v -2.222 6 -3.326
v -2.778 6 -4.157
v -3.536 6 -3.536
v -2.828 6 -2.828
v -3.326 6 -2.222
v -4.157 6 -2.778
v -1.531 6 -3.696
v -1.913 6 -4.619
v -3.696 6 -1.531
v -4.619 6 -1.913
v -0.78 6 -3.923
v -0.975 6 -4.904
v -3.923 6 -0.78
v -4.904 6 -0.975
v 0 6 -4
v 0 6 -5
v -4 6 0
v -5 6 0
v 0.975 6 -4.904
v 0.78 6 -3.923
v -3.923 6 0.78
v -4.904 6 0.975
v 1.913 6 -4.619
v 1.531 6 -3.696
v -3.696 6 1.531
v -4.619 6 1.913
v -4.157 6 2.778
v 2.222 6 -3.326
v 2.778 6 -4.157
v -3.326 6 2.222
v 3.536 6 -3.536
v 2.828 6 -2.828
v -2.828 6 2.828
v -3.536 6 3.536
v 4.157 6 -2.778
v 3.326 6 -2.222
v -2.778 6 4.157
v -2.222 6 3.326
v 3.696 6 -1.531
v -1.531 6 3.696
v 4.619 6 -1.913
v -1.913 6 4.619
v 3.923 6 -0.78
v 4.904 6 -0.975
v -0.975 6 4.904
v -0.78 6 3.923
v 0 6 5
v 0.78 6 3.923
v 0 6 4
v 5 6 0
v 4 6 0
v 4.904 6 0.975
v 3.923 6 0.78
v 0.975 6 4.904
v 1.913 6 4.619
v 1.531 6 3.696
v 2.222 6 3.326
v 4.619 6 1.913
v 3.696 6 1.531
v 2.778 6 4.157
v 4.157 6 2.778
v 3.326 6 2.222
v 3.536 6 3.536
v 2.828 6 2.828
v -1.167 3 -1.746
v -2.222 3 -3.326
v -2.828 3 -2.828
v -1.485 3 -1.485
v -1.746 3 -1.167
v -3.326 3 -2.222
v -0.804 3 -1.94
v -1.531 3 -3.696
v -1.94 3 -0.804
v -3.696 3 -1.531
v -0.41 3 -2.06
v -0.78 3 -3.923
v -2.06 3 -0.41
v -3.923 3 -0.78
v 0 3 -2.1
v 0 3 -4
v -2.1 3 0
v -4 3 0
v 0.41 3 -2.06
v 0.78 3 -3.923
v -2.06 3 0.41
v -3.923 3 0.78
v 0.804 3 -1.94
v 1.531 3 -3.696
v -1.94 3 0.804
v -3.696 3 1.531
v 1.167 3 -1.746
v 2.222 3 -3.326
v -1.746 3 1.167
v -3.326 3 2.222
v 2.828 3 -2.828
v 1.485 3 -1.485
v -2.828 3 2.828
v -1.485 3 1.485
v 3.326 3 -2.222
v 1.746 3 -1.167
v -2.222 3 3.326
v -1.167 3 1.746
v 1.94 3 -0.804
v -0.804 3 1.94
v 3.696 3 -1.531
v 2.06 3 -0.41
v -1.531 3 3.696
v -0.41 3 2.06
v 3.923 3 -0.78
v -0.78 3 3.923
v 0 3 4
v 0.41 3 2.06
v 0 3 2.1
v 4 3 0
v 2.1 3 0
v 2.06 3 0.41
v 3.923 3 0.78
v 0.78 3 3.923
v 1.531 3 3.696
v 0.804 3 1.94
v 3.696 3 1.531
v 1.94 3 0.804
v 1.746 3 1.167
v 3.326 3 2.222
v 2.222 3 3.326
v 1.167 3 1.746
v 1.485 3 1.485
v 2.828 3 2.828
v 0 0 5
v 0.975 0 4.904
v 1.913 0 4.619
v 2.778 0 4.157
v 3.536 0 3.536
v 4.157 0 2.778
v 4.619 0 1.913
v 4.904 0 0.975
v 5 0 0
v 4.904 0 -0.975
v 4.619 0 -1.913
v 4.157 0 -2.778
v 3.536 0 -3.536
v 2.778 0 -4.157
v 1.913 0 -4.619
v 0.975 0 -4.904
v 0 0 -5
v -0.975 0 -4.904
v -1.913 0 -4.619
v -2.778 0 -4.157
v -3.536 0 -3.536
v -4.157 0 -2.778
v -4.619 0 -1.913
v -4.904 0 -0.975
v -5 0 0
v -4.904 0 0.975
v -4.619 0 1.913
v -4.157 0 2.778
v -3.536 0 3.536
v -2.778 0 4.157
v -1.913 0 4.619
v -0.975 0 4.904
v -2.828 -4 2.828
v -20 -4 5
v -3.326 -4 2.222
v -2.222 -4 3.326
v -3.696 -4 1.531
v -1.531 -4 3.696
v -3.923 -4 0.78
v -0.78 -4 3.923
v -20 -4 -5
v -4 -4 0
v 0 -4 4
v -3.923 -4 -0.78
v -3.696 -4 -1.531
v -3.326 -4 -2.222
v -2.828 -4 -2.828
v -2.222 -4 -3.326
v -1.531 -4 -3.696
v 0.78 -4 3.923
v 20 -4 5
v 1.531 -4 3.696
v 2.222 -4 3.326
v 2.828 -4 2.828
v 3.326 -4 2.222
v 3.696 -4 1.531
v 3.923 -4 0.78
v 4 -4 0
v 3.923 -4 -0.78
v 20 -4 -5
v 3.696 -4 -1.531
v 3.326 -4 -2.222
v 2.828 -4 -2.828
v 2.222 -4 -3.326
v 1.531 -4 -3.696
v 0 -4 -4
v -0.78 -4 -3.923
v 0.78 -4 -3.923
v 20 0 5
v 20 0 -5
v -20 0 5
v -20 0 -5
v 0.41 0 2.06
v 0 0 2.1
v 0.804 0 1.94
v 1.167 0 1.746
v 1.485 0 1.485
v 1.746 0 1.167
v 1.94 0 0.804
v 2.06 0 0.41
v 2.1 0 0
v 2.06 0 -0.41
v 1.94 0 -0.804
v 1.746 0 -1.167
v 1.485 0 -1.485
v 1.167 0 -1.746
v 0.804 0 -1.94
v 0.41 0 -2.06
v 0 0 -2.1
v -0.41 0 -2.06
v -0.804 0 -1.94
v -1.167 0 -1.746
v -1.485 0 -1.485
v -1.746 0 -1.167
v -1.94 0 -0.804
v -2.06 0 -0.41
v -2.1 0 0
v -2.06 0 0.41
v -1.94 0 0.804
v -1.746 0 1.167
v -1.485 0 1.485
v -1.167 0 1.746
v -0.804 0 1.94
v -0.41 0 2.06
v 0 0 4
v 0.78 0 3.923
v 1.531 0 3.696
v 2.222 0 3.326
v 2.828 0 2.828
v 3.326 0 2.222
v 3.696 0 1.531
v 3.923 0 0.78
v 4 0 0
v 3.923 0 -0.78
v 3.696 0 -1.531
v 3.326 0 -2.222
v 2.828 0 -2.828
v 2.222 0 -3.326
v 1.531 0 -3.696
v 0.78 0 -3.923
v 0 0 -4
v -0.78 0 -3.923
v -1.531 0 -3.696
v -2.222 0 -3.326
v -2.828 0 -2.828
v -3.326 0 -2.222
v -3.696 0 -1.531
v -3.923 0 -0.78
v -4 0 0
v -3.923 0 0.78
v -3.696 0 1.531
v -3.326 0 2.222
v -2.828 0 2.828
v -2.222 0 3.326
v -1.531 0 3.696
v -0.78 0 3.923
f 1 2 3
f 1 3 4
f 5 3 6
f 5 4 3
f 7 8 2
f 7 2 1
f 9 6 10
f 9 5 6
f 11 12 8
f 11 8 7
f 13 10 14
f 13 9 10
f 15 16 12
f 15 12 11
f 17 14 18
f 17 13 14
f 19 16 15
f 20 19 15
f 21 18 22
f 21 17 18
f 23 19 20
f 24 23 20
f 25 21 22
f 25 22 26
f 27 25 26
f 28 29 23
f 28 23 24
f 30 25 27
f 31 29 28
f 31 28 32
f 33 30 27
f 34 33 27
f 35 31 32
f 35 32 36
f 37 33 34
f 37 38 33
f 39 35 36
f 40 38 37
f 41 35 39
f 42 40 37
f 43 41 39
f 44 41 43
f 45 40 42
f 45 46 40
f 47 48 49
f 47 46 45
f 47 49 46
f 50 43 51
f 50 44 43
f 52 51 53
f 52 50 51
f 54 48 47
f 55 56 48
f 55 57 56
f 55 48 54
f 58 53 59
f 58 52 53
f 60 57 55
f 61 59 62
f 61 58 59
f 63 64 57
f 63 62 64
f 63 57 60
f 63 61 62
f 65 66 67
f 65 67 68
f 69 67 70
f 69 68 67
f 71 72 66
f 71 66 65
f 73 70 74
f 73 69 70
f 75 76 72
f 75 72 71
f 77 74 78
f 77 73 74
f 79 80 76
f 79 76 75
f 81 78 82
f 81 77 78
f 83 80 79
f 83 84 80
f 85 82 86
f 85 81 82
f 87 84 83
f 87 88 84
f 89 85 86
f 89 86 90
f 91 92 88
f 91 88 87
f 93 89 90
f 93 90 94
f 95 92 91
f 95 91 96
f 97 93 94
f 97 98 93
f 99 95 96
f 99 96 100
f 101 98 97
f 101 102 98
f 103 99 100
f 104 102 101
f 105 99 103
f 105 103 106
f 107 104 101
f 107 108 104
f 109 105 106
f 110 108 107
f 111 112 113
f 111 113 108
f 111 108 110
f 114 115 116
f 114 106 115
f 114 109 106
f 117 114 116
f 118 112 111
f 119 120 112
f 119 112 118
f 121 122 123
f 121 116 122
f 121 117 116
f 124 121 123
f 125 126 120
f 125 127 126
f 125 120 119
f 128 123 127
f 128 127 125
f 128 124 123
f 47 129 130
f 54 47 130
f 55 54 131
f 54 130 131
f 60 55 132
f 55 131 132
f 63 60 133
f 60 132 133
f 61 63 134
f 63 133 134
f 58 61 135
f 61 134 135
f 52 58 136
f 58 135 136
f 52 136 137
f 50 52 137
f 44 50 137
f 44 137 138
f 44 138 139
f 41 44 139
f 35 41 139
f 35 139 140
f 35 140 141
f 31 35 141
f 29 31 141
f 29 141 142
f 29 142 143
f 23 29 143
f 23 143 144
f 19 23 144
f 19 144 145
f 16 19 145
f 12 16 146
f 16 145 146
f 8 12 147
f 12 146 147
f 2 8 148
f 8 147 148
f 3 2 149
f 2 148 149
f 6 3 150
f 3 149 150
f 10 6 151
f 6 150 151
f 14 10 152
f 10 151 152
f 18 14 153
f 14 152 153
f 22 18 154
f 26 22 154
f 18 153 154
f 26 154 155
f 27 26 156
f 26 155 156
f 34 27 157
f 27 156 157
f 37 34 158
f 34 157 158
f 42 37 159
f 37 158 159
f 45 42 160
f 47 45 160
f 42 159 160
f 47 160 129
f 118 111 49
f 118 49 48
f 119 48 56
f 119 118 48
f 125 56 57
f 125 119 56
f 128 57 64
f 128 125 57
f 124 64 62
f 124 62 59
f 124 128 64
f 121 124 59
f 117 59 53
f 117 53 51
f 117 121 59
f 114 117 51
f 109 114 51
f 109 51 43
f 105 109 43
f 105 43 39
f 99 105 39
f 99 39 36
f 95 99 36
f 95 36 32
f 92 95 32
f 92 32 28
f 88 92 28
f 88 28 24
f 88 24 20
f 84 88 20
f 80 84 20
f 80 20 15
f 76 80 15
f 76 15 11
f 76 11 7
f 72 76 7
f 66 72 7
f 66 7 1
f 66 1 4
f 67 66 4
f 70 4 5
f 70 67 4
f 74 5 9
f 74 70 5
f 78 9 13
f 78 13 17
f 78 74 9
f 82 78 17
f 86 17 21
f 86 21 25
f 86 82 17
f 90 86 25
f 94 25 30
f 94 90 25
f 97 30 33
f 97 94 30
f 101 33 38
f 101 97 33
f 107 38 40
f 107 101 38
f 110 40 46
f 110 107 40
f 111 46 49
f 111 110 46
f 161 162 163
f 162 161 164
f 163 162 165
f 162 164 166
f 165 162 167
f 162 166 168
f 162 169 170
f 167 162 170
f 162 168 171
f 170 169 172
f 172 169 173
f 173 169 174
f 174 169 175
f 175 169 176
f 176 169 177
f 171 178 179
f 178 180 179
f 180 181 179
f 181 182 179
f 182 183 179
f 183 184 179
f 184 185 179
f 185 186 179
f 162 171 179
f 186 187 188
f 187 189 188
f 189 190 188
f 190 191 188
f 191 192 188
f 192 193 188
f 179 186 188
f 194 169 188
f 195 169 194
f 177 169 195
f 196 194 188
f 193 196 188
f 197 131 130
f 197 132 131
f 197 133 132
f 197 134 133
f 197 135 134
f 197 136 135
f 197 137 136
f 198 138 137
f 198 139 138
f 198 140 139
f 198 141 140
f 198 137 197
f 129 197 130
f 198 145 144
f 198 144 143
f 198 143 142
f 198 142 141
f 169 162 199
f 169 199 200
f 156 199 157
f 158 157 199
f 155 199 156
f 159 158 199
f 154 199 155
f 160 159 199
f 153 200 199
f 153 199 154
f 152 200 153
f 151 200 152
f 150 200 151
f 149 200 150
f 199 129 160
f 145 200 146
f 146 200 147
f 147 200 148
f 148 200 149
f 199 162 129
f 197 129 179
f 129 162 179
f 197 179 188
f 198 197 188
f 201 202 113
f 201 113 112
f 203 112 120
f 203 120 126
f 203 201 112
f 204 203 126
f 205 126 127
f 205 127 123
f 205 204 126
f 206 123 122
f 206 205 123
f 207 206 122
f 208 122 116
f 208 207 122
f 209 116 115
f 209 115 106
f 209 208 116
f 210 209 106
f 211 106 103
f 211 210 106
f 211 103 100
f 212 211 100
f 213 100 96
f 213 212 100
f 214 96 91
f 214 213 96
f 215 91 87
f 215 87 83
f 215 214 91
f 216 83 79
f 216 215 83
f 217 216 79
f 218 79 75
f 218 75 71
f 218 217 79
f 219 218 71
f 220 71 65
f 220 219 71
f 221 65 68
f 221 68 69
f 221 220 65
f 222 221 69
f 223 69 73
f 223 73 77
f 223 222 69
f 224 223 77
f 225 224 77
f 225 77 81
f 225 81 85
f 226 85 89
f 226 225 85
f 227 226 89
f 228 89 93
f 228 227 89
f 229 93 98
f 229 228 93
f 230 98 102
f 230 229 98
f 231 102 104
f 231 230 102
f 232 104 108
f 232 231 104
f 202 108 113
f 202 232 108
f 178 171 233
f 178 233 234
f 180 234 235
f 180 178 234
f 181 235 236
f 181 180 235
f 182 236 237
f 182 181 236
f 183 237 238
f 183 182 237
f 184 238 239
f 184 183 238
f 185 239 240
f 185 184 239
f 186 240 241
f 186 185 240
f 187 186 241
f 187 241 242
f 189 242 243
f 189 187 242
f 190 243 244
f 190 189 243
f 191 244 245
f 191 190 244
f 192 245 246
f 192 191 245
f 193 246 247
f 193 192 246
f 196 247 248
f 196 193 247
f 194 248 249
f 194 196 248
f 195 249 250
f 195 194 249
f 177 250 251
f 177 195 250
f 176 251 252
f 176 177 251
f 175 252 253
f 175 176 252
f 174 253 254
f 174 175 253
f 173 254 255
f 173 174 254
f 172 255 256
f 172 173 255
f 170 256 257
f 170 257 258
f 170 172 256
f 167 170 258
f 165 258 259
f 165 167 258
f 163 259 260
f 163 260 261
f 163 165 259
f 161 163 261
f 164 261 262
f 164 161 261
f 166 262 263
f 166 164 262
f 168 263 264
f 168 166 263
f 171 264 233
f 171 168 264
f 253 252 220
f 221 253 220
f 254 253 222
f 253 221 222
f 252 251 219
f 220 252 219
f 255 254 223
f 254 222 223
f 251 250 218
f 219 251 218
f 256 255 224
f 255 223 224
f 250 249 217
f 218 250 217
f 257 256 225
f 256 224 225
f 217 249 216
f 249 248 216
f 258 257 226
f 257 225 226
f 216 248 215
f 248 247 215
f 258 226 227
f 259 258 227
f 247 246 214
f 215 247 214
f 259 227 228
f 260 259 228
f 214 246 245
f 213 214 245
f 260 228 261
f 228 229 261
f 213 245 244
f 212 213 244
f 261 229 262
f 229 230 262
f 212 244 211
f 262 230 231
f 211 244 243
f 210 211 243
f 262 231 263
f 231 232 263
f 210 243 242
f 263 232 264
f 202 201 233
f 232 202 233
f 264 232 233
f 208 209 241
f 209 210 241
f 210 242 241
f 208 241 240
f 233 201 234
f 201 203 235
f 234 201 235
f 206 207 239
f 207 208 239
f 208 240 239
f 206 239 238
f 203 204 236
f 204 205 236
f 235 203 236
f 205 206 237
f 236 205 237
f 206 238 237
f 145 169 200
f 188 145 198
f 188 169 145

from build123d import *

# Parameters (mm, degrees)
SKETCH1_R           = 4
SKETCH1_R_2         = 2.1
BOSS_EXTRUDE1_DEPTH = 3
SKETCH2_R           = 5
SKETCH2_R_2         = 4
BOSS_EXTRUDE2_DEPTH = 6
BOSS_EXTRUDE3_START = -4
SKETCH3_W           = 40
SKETCH3_H           = 10
SKETCH3_R           = 4
BOSS_EXTRUDE3_DEPTH = 4


with BuildPart() as part:
    # Sketch1 → Boss-Extrude1 (new body)
    with BuildSketch(Plane(origin=(0, 0, 0), x_dir=(1, 0, 0), z_dir=(0, 1, 0))):
        with Locations(Location((0, 0, 0), (0, 0, 270))):
            Circle(SKETCH1_R)
        with Locations(Location((0, 0, 0), (0, 0, 270))):
            Circle(SKETCH1_R_2, mode=Mode.SUBTRACT)
    extrude(amount=BOSS_EXTRUDE1_DEPTH)

    # Sketch2 → Boss-Extrude2 (add)
    with BuildSketch(Plane(origin=(0, 0, 0), x_dir=(1, 0, 0), z_dir=(0, 1, 0))):
        with Locations(Location((0, 0, 0), (0, 0, 270))):
            Circle(SKETCH2_R)
        with Locations(Location((0, 0, 0), (0, 0, 270))):
            Circle(SKETCH2_R_2, mode=Mode.SUBTRACT)
    extrude(amount=BOSS_EXTRUDE2_DEPTH)

    # Sketch3 → Boss-Extrude3 (add)
    with BuildSketch(Plane(origin=(0, 0, 0), x_dir=(1, 0, 0), z_dir=(0, 1, 0)).offset(BOSS_EXTRUDE3_START)):
        Rectangle(SKETCH3_W, SKETCH3_H)
        with Locations(Location((0, 0, 0), (0, 0, 270))):
            Circle(SKETCH3_R, mode=Mode.SUBTRACT)
    extrude(amount=BOSS_EXTRUDE3_DEPTH)


solid = part.part
